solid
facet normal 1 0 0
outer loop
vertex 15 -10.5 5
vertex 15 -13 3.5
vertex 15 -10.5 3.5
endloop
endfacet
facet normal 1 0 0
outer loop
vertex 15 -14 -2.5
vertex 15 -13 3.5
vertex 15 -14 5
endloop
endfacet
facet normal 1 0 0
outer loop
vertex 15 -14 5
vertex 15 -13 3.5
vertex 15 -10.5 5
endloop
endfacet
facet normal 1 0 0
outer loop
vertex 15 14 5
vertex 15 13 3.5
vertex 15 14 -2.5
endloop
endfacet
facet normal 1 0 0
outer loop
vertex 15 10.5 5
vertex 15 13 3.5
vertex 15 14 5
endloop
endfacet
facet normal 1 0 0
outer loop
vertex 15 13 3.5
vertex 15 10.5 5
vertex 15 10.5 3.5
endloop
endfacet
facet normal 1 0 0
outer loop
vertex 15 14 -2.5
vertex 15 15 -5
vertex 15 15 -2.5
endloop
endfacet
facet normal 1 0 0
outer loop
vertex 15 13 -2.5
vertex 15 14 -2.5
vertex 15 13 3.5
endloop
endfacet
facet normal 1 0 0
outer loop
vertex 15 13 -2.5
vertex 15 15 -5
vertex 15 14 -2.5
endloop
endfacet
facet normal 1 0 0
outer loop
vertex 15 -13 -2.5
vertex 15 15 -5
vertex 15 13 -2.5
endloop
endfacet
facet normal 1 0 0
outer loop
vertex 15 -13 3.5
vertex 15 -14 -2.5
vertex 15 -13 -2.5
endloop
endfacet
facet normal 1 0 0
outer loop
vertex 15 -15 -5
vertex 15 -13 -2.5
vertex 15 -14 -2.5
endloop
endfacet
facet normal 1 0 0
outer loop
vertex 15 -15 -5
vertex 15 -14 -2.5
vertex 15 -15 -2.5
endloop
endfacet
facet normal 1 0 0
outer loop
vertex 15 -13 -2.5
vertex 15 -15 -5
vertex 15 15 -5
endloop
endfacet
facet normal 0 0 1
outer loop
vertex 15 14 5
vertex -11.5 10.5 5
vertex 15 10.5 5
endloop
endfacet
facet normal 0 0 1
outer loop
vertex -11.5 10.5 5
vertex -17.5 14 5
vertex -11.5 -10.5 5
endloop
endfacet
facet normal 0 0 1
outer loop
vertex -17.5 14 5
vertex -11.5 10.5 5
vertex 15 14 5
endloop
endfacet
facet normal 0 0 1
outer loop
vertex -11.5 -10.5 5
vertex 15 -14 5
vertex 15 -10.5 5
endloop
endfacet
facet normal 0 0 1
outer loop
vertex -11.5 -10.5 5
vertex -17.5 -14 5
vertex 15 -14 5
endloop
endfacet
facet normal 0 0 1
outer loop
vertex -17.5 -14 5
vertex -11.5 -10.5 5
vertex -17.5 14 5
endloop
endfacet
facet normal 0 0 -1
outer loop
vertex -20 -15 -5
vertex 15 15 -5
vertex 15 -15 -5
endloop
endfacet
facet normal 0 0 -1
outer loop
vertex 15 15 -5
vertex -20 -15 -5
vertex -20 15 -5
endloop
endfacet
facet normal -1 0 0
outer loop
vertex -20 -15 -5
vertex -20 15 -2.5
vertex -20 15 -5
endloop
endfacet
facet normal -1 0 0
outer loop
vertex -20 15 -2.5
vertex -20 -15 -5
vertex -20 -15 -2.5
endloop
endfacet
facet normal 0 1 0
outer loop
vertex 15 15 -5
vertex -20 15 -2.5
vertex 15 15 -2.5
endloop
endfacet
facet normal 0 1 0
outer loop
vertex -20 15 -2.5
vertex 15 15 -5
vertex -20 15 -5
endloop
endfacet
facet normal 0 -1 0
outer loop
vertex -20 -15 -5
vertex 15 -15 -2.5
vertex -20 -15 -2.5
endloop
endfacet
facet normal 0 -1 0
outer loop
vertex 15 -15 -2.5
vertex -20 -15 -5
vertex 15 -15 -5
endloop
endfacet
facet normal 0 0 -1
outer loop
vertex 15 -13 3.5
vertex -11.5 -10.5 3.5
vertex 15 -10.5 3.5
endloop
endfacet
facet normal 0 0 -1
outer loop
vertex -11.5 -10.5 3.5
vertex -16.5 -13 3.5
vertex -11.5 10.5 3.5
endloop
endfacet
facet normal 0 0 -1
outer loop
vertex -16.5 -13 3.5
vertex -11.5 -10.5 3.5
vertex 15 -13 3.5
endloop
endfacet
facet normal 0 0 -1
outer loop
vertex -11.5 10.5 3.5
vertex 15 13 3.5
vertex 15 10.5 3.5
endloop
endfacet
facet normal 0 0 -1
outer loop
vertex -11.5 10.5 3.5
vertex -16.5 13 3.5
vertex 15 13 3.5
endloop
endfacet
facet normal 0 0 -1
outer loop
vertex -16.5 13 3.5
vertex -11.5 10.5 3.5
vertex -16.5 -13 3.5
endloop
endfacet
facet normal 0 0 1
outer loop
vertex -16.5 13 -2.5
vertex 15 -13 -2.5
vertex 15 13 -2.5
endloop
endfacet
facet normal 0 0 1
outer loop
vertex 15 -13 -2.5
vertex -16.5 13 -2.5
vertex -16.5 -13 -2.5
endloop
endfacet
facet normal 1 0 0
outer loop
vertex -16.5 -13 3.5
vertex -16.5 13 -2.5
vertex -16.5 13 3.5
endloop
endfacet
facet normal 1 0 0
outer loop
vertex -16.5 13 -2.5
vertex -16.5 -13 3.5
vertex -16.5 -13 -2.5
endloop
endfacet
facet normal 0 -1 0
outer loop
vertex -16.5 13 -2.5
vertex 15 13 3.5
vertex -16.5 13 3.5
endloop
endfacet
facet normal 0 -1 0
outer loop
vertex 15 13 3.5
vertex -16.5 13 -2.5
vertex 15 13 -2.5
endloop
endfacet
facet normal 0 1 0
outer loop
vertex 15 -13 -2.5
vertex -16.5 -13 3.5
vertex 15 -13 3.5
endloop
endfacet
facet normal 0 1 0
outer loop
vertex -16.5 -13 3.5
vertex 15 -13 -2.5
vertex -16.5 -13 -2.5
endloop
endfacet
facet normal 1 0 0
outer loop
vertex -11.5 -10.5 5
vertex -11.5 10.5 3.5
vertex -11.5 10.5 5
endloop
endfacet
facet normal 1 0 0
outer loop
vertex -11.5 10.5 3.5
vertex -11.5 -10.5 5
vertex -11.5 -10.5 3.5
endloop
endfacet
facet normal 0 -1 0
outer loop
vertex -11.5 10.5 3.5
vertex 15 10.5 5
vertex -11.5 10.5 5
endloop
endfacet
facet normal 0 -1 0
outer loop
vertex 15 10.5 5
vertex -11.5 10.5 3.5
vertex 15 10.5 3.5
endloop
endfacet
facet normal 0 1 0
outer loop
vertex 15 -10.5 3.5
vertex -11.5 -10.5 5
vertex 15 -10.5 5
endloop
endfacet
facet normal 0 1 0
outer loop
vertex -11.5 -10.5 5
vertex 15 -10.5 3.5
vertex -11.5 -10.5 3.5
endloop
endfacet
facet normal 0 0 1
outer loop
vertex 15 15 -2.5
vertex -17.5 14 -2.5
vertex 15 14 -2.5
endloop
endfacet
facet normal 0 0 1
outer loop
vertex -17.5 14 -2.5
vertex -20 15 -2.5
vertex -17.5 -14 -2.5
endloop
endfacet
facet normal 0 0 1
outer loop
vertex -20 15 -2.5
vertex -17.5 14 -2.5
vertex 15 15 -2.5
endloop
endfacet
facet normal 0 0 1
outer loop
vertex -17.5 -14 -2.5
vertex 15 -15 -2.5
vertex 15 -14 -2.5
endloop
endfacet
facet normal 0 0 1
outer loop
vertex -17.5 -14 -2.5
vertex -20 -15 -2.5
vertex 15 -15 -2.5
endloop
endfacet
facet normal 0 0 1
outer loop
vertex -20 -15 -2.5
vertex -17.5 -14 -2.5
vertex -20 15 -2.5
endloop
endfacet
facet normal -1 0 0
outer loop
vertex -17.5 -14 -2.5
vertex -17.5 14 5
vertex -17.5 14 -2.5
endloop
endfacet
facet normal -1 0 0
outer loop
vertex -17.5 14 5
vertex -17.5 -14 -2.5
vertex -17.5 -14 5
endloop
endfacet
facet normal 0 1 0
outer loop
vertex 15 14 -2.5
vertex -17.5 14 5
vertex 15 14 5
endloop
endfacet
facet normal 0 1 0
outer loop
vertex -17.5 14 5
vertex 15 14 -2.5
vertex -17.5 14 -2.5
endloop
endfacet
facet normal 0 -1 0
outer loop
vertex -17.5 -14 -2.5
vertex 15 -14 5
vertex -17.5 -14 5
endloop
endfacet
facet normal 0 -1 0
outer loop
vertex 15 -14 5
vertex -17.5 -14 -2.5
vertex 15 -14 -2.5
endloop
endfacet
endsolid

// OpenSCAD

pad_thickness = 10; //[10:10]
pad_x = 35; //[32:0.5:150]
pad_y = 30; //[26:0.5:150]


difference() {
    
    difference() {
        translate ([pad_x/2- pad_x + 15,0,0])
            color ("blue")
                cube([pad_x,pad_y,pad_thickness], center=true)
        ;
        
        translate ([0,0,0.5]) 
            color ("red")
                cube([33,26,6], center=true)
        ;
        
        translate ([2.5,0,pad_thickness/3.5]) 
            color ("Orange")
                cube([28,21,pad_thickness / 2 + 5], center=true)
        ;
    }


    difference() {
        translate ([pad_x/2 - pad_x + 12.6,0,pad_thickness/2 - 2.5]) 
            color ("yellow")
                cube([pad_x + 5,pad_y + 5,pad_thickness], center=true)
        ;
            
        translate ([-1,0,pad_thickness/2 - 2.5]) 
            color ("Aqua")
                cube([33,28,pad_thickness], center=true)
        ;
    }
}
